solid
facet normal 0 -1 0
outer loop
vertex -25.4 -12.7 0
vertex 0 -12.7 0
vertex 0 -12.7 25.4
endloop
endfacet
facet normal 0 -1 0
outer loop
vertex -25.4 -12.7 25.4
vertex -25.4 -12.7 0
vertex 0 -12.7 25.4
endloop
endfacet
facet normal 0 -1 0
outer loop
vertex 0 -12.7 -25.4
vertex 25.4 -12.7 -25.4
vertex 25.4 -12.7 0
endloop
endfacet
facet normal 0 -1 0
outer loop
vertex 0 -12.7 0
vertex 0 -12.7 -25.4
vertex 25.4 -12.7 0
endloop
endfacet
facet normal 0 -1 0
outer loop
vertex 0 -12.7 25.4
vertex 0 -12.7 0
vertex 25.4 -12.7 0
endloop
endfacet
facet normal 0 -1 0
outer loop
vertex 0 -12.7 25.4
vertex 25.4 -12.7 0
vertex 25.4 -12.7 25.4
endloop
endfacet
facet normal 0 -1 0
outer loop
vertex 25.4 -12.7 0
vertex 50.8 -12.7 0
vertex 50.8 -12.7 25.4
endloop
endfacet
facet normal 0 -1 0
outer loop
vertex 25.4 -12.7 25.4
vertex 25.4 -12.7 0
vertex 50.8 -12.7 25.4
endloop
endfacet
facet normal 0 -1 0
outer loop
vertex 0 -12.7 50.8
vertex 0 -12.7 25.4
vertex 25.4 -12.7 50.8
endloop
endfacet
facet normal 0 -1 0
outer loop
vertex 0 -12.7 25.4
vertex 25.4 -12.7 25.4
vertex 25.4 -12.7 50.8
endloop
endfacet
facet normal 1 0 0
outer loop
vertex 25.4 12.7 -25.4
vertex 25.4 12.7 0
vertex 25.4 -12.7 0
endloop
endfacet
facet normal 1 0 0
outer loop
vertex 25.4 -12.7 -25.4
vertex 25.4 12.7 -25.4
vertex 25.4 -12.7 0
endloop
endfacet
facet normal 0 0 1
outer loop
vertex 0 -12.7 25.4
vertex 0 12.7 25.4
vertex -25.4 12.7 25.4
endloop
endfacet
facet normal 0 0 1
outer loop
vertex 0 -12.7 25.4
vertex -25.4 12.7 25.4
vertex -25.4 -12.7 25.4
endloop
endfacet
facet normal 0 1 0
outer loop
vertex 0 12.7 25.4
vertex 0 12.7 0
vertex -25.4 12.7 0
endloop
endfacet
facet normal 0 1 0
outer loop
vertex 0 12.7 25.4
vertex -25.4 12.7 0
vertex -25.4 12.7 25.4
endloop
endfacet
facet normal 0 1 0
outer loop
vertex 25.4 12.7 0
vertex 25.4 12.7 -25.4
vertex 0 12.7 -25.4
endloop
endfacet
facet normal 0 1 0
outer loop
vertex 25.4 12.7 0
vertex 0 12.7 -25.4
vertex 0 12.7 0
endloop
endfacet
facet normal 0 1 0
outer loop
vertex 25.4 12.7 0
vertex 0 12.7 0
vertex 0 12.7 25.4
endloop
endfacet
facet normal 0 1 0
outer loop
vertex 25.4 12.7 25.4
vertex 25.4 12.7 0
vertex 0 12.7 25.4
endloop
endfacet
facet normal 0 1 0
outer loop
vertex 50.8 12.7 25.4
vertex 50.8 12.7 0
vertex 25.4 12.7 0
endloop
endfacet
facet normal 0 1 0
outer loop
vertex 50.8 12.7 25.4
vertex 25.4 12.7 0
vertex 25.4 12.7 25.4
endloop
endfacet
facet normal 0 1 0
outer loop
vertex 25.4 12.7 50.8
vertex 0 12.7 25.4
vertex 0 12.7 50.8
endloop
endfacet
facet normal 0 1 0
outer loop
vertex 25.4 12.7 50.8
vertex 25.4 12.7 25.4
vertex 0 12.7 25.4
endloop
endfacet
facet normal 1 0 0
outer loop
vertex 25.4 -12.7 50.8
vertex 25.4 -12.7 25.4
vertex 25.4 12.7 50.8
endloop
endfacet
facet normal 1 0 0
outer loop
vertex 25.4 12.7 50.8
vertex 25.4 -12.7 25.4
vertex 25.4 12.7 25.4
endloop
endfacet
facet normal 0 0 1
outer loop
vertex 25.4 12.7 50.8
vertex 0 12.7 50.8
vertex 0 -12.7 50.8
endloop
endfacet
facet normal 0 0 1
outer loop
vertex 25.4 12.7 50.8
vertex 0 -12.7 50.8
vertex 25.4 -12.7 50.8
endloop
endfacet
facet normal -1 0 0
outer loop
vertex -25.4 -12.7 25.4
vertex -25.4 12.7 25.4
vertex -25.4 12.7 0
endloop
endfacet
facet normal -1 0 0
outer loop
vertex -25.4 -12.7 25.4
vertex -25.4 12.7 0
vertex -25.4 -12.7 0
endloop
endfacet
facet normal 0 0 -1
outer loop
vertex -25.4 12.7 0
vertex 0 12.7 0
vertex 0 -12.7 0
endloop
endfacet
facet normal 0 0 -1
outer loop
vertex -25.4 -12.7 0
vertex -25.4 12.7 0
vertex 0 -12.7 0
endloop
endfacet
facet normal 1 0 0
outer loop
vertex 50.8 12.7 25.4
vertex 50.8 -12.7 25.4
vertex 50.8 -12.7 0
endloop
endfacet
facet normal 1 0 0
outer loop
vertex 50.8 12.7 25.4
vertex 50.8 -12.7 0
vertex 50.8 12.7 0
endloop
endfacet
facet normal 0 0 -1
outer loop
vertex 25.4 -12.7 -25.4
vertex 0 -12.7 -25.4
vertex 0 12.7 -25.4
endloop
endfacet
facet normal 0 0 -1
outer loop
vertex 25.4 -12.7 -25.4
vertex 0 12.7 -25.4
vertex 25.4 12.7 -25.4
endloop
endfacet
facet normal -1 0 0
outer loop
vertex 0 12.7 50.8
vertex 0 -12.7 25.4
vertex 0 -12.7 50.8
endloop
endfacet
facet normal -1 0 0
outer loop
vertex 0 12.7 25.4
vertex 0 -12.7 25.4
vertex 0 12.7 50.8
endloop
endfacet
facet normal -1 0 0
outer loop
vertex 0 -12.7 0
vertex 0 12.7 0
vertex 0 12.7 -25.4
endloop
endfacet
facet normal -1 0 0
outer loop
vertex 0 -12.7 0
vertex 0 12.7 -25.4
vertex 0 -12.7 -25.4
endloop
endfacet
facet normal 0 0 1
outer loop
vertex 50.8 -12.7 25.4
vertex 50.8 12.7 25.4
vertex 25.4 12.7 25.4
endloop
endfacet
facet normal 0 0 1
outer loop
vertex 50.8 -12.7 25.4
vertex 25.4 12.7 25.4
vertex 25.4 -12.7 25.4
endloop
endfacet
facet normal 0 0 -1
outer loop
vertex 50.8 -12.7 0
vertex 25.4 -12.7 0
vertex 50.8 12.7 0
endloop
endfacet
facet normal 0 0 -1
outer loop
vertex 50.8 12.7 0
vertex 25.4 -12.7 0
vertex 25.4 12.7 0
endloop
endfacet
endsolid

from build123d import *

# Parameters (mm, degrees)
F0_W     = 25.4
F0_H     = 25.4
F1_DEPTH = 12.7
F2_W     = 25.4
F2_H     = 25.4
F3_DEPTH = 25.4
F4_W     = 25.4
F4_H     = 25.4
F5_DEPTH = 25.4
F6_W     = 25.4
F6_H     = 25.4
F7_DEPTH = 25.4
F8_W     = 25.4
F8_H     = 25.4
F9_DEPTH = 25.4


with BuildPart() as f1:
    # F0 (on Front) → F1 (new body, symmetric)
    with BuildSketch(Plane.XZ):
        with Locations((12.7, 12.7)):
            Rectangle(F0_W, F0_H)
    extrude(amount=F1_DEPTH, both=True)

    # F2 (on face) → F3 (join)
    with BuildSketch(Plane(origin=(0, 0, 0), x_dir=(1, 0, 0), z_dir=(0, 0, -1))):
        with Locations((12.7, 0)):
            Rectangle(F2_W, F2_H)
    extrude(amount=F3_DEPTH)

    # F4 (on face) → F5 (join)
    with BuildSketch(Plane.YZ.offset(25.4)):
        with Locations((0, 12.7)):
            Rectangle(F4_W, F4_H)
    extrude(amount=F5_DEPTH)

    # F6 (on face) → F7 (join)
    with BuildSketch(Plane(origin=(0, 0, 0), x_dir=(0, -1, 0), z_dir=(-1, 0, 0))):
        with Locations((0, 12.7)):
            Rectangle(F6_W, F6_H)
    extrude(amount=F7_DEPTH)

    # F8 (on face) → F9 (join)
    with BuildSketch(Plane.XY.offset(25.4)):
        with Locations((12.7, 0)):
            Rectangle(F8_W, F8_H)
    extrude(amount=F9_DEPTH)


solid = f1.part
